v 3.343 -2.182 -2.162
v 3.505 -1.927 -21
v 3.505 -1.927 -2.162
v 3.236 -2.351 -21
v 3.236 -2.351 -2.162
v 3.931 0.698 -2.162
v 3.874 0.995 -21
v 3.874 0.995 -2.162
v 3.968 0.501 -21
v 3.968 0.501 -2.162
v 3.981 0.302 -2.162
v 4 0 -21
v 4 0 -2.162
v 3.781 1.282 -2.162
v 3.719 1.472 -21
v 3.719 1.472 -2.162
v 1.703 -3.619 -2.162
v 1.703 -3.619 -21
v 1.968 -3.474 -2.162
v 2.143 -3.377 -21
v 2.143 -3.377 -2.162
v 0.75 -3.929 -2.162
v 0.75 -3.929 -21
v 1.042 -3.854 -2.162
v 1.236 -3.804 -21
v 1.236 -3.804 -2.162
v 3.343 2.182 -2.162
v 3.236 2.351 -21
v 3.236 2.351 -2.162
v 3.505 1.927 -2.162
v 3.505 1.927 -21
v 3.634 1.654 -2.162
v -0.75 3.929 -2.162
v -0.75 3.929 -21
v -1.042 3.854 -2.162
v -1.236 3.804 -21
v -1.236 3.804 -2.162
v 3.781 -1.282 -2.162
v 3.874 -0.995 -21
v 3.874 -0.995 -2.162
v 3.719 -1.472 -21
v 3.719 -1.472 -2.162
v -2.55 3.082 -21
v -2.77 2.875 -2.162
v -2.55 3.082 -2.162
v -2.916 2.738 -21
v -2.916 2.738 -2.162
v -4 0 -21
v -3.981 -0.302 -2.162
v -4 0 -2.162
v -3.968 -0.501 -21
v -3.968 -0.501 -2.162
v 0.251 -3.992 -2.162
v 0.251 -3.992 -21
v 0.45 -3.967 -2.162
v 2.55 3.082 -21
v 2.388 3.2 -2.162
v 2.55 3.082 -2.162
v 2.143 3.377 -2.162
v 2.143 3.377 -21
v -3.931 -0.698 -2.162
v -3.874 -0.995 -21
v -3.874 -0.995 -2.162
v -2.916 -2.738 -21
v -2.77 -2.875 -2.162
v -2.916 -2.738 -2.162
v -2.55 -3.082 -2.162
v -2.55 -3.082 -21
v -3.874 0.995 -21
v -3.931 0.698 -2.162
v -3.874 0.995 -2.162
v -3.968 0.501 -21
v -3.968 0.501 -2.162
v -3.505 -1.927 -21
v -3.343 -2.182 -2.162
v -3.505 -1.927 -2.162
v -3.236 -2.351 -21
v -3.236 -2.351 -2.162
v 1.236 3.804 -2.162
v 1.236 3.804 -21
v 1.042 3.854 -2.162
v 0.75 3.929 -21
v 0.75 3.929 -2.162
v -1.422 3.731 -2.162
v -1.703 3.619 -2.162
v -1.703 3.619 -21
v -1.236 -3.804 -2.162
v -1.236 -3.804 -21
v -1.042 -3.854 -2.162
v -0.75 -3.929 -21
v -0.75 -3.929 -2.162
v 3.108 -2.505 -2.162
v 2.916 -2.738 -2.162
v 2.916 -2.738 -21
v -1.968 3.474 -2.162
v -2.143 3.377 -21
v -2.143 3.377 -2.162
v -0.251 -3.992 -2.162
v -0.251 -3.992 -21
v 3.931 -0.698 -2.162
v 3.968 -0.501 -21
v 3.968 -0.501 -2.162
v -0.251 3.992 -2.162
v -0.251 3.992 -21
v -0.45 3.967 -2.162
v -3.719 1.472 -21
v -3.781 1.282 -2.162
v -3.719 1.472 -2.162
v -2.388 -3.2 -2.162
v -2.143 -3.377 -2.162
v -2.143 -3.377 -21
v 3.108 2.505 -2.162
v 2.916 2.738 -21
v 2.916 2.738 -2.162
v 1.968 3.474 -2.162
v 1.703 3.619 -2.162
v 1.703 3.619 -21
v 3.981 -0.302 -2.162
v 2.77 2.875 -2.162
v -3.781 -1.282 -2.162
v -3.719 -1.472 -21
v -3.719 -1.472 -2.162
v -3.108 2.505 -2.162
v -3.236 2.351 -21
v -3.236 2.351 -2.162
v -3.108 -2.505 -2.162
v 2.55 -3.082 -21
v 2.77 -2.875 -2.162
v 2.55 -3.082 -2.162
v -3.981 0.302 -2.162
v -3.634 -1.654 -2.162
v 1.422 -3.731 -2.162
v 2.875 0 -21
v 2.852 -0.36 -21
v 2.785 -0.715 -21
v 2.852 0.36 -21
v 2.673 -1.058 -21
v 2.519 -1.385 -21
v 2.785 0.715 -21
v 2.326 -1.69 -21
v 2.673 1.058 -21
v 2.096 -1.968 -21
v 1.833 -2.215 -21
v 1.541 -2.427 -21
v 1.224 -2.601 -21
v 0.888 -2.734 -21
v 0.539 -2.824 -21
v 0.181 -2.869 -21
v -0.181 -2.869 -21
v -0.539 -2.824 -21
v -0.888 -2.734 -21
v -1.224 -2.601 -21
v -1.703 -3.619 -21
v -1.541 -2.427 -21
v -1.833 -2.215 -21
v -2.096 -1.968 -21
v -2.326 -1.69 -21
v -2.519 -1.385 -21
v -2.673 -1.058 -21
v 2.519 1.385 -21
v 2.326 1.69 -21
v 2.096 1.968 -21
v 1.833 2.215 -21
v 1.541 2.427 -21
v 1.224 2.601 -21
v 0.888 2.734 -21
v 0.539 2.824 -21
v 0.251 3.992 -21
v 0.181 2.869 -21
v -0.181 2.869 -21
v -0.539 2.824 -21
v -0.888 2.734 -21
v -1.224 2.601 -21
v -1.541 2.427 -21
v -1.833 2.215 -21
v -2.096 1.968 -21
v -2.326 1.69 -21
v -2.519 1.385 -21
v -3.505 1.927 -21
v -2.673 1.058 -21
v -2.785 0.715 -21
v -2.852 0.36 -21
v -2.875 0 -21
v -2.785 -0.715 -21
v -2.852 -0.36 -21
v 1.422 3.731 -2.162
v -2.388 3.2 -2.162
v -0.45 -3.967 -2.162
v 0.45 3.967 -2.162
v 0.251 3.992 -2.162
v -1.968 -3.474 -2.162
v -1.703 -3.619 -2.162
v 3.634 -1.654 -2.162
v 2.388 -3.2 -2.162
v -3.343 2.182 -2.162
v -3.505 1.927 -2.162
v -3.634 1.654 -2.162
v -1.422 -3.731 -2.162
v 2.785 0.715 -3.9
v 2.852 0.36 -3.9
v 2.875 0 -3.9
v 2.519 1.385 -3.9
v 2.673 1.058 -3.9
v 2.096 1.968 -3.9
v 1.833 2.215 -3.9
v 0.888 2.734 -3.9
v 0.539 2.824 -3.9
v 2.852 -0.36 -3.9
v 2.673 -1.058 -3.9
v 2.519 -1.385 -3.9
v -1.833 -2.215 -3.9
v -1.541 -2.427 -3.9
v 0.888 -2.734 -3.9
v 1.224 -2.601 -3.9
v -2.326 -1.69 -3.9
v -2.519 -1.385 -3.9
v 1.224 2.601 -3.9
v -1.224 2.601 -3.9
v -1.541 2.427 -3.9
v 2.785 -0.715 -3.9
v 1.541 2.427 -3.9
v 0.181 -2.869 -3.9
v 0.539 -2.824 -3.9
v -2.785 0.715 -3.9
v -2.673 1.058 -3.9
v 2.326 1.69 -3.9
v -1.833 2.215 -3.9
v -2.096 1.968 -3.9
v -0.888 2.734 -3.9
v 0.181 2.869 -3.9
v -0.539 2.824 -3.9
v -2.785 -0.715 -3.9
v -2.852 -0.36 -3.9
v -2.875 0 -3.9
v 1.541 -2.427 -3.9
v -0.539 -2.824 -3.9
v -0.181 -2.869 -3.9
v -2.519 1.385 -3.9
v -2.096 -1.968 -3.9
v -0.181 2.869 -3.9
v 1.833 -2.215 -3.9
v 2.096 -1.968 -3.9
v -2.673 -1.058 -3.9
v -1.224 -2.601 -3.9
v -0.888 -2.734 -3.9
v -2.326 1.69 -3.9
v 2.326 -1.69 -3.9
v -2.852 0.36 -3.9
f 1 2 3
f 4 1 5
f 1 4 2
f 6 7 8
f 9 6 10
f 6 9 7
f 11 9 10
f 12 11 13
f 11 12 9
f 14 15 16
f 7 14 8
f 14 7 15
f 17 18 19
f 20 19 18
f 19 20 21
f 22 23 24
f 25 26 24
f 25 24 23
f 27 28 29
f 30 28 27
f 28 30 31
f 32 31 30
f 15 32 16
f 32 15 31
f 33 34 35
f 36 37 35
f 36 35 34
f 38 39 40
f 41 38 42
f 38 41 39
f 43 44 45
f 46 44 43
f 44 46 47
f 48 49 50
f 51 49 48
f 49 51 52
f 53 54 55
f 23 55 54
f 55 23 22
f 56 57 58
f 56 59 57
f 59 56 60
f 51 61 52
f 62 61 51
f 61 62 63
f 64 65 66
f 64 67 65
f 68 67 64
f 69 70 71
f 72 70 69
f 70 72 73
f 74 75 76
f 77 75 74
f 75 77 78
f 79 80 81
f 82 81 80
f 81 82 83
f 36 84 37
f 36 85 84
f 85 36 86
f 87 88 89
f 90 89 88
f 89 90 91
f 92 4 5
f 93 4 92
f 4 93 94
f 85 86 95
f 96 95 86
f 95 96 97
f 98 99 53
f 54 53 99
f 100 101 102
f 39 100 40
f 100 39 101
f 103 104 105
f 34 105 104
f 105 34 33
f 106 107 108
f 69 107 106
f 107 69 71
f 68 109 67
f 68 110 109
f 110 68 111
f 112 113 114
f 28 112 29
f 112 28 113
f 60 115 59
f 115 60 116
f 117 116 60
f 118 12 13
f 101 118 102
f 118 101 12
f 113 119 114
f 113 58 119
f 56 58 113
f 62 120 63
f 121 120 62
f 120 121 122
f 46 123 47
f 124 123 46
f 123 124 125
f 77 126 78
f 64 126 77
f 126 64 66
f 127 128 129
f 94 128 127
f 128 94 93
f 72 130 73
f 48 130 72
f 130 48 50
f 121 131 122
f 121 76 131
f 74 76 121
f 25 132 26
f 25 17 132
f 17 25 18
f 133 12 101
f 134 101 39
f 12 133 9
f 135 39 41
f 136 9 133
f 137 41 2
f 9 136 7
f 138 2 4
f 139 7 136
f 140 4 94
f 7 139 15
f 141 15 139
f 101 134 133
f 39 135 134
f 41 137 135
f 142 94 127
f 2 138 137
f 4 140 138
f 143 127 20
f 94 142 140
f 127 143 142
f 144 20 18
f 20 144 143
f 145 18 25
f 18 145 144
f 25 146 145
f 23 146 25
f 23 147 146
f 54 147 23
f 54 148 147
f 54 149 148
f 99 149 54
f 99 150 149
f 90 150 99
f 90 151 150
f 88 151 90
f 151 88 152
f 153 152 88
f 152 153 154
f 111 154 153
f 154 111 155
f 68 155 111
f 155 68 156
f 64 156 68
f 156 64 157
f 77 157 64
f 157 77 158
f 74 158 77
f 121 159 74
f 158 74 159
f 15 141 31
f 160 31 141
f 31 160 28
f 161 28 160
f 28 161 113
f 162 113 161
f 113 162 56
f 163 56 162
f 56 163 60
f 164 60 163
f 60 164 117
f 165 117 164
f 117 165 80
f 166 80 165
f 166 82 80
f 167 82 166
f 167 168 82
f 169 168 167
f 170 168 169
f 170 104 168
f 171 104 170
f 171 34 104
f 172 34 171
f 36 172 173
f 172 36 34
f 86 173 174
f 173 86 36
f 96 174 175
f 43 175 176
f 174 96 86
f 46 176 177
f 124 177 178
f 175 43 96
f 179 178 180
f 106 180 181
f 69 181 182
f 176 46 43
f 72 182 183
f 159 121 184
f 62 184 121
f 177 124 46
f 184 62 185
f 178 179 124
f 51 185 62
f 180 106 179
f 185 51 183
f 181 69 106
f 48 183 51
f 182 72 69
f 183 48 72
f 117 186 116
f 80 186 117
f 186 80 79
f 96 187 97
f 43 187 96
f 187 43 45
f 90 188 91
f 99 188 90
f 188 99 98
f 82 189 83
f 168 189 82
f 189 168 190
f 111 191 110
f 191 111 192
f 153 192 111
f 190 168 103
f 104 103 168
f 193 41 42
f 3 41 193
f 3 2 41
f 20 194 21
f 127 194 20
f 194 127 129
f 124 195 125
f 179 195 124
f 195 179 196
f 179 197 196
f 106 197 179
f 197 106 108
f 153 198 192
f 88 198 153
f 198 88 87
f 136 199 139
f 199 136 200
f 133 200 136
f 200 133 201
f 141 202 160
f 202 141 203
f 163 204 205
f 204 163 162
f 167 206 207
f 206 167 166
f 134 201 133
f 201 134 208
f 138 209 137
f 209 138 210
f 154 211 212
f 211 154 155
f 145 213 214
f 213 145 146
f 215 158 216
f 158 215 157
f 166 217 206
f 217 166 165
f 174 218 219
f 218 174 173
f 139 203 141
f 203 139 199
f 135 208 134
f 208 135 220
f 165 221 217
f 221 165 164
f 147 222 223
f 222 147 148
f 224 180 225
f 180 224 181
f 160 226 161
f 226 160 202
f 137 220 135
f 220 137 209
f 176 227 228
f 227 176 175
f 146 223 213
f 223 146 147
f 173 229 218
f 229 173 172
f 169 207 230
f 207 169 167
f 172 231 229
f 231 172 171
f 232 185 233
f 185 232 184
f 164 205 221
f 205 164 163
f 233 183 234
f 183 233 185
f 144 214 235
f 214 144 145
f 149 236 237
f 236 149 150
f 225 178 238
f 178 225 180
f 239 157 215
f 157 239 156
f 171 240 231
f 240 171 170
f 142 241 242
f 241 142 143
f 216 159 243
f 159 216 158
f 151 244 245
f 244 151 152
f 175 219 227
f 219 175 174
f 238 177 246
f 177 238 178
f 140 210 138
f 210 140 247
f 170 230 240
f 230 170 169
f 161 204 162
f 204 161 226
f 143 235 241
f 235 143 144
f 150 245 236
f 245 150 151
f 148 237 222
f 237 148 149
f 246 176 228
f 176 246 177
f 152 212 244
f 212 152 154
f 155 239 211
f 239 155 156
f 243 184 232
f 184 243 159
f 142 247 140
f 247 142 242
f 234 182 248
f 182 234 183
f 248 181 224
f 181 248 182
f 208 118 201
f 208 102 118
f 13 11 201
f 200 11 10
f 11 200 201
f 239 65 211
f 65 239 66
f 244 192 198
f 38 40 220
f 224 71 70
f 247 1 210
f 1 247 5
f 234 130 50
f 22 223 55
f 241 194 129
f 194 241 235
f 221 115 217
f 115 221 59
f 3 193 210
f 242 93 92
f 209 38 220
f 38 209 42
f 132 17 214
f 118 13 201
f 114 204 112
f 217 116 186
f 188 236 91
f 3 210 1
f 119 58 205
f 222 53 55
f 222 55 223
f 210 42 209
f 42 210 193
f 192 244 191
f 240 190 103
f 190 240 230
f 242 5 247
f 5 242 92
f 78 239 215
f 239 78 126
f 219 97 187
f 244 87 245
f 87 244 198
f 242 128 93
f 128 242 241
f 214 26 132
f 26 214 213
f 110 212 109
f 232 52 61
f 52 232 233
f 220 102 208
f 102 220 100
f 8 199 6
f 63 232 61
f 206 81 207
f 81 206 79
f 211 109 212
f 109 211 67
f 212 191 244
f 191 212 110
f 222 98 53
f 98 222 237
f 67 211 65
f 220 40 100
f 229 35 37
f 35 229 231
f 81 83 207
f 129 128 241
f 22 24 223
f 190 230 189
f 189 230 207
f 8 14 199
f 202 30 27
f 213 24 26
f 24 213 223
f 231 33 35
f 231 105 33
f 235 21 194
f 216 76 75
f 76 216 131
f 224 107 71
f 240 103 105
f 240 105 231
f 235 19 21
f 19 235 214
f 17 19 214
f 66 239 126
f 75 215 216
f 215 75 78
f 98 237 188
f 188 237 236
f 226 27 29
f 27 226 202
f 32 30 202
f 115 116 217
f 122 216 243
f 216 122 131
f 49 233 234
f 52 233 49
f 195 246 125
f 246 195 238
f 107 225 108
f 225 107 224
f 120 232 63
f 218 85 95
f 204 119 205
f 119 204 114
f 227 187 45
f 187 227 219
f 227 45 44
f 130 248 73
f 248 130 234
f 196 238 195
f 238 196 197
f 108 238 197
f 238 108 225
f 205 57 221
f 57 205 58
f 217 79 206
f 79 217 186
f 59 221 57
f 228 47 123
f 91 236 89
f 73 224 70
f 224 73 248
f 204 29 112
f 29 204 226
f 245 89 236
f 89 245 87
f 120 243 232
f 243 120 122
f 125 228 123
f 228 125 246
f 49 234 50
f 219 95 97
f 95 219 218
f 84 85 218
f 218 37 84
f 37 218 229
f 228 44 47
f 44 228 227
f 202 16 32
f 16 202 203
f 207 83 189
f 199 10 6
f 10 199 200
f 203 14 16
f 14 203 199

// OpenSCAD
$fn = 50;

difference() {
	union() {
		translate(v = [0, 0, -21.0]) {
			cylinder(h = 24, r = 4.0);
		}
		#translate(v = [0, 0, -24.0]) {
			cylinder(h = 24, r = 2.875);
		}
	}
	union() {
		translate(v = [0, 0, 0]) {
			rotate(a = [0, 0, 0]) {
				difference() {
					union() {
						translate(v = [0, 0, -24.0]) {
							cylinder(h = 24, r = 2.6);
						}
						translate(v = [0, 0, -3.9]) {
							cylinder(h = 3.9, r1 = 2.875, r2 = 5.4);
						}
						translate(v = [0, 0, -24.0]) {
							cylinder(h = 24, r = 2.875);
						}
						translate(v = [0, 0, -24.0]) {
							cylinder(h = 24, r = 2.6);
						}
					}
					union();
				}
			}
		}
		#cylinder(h = 3, r = 5.0);
	}
}
